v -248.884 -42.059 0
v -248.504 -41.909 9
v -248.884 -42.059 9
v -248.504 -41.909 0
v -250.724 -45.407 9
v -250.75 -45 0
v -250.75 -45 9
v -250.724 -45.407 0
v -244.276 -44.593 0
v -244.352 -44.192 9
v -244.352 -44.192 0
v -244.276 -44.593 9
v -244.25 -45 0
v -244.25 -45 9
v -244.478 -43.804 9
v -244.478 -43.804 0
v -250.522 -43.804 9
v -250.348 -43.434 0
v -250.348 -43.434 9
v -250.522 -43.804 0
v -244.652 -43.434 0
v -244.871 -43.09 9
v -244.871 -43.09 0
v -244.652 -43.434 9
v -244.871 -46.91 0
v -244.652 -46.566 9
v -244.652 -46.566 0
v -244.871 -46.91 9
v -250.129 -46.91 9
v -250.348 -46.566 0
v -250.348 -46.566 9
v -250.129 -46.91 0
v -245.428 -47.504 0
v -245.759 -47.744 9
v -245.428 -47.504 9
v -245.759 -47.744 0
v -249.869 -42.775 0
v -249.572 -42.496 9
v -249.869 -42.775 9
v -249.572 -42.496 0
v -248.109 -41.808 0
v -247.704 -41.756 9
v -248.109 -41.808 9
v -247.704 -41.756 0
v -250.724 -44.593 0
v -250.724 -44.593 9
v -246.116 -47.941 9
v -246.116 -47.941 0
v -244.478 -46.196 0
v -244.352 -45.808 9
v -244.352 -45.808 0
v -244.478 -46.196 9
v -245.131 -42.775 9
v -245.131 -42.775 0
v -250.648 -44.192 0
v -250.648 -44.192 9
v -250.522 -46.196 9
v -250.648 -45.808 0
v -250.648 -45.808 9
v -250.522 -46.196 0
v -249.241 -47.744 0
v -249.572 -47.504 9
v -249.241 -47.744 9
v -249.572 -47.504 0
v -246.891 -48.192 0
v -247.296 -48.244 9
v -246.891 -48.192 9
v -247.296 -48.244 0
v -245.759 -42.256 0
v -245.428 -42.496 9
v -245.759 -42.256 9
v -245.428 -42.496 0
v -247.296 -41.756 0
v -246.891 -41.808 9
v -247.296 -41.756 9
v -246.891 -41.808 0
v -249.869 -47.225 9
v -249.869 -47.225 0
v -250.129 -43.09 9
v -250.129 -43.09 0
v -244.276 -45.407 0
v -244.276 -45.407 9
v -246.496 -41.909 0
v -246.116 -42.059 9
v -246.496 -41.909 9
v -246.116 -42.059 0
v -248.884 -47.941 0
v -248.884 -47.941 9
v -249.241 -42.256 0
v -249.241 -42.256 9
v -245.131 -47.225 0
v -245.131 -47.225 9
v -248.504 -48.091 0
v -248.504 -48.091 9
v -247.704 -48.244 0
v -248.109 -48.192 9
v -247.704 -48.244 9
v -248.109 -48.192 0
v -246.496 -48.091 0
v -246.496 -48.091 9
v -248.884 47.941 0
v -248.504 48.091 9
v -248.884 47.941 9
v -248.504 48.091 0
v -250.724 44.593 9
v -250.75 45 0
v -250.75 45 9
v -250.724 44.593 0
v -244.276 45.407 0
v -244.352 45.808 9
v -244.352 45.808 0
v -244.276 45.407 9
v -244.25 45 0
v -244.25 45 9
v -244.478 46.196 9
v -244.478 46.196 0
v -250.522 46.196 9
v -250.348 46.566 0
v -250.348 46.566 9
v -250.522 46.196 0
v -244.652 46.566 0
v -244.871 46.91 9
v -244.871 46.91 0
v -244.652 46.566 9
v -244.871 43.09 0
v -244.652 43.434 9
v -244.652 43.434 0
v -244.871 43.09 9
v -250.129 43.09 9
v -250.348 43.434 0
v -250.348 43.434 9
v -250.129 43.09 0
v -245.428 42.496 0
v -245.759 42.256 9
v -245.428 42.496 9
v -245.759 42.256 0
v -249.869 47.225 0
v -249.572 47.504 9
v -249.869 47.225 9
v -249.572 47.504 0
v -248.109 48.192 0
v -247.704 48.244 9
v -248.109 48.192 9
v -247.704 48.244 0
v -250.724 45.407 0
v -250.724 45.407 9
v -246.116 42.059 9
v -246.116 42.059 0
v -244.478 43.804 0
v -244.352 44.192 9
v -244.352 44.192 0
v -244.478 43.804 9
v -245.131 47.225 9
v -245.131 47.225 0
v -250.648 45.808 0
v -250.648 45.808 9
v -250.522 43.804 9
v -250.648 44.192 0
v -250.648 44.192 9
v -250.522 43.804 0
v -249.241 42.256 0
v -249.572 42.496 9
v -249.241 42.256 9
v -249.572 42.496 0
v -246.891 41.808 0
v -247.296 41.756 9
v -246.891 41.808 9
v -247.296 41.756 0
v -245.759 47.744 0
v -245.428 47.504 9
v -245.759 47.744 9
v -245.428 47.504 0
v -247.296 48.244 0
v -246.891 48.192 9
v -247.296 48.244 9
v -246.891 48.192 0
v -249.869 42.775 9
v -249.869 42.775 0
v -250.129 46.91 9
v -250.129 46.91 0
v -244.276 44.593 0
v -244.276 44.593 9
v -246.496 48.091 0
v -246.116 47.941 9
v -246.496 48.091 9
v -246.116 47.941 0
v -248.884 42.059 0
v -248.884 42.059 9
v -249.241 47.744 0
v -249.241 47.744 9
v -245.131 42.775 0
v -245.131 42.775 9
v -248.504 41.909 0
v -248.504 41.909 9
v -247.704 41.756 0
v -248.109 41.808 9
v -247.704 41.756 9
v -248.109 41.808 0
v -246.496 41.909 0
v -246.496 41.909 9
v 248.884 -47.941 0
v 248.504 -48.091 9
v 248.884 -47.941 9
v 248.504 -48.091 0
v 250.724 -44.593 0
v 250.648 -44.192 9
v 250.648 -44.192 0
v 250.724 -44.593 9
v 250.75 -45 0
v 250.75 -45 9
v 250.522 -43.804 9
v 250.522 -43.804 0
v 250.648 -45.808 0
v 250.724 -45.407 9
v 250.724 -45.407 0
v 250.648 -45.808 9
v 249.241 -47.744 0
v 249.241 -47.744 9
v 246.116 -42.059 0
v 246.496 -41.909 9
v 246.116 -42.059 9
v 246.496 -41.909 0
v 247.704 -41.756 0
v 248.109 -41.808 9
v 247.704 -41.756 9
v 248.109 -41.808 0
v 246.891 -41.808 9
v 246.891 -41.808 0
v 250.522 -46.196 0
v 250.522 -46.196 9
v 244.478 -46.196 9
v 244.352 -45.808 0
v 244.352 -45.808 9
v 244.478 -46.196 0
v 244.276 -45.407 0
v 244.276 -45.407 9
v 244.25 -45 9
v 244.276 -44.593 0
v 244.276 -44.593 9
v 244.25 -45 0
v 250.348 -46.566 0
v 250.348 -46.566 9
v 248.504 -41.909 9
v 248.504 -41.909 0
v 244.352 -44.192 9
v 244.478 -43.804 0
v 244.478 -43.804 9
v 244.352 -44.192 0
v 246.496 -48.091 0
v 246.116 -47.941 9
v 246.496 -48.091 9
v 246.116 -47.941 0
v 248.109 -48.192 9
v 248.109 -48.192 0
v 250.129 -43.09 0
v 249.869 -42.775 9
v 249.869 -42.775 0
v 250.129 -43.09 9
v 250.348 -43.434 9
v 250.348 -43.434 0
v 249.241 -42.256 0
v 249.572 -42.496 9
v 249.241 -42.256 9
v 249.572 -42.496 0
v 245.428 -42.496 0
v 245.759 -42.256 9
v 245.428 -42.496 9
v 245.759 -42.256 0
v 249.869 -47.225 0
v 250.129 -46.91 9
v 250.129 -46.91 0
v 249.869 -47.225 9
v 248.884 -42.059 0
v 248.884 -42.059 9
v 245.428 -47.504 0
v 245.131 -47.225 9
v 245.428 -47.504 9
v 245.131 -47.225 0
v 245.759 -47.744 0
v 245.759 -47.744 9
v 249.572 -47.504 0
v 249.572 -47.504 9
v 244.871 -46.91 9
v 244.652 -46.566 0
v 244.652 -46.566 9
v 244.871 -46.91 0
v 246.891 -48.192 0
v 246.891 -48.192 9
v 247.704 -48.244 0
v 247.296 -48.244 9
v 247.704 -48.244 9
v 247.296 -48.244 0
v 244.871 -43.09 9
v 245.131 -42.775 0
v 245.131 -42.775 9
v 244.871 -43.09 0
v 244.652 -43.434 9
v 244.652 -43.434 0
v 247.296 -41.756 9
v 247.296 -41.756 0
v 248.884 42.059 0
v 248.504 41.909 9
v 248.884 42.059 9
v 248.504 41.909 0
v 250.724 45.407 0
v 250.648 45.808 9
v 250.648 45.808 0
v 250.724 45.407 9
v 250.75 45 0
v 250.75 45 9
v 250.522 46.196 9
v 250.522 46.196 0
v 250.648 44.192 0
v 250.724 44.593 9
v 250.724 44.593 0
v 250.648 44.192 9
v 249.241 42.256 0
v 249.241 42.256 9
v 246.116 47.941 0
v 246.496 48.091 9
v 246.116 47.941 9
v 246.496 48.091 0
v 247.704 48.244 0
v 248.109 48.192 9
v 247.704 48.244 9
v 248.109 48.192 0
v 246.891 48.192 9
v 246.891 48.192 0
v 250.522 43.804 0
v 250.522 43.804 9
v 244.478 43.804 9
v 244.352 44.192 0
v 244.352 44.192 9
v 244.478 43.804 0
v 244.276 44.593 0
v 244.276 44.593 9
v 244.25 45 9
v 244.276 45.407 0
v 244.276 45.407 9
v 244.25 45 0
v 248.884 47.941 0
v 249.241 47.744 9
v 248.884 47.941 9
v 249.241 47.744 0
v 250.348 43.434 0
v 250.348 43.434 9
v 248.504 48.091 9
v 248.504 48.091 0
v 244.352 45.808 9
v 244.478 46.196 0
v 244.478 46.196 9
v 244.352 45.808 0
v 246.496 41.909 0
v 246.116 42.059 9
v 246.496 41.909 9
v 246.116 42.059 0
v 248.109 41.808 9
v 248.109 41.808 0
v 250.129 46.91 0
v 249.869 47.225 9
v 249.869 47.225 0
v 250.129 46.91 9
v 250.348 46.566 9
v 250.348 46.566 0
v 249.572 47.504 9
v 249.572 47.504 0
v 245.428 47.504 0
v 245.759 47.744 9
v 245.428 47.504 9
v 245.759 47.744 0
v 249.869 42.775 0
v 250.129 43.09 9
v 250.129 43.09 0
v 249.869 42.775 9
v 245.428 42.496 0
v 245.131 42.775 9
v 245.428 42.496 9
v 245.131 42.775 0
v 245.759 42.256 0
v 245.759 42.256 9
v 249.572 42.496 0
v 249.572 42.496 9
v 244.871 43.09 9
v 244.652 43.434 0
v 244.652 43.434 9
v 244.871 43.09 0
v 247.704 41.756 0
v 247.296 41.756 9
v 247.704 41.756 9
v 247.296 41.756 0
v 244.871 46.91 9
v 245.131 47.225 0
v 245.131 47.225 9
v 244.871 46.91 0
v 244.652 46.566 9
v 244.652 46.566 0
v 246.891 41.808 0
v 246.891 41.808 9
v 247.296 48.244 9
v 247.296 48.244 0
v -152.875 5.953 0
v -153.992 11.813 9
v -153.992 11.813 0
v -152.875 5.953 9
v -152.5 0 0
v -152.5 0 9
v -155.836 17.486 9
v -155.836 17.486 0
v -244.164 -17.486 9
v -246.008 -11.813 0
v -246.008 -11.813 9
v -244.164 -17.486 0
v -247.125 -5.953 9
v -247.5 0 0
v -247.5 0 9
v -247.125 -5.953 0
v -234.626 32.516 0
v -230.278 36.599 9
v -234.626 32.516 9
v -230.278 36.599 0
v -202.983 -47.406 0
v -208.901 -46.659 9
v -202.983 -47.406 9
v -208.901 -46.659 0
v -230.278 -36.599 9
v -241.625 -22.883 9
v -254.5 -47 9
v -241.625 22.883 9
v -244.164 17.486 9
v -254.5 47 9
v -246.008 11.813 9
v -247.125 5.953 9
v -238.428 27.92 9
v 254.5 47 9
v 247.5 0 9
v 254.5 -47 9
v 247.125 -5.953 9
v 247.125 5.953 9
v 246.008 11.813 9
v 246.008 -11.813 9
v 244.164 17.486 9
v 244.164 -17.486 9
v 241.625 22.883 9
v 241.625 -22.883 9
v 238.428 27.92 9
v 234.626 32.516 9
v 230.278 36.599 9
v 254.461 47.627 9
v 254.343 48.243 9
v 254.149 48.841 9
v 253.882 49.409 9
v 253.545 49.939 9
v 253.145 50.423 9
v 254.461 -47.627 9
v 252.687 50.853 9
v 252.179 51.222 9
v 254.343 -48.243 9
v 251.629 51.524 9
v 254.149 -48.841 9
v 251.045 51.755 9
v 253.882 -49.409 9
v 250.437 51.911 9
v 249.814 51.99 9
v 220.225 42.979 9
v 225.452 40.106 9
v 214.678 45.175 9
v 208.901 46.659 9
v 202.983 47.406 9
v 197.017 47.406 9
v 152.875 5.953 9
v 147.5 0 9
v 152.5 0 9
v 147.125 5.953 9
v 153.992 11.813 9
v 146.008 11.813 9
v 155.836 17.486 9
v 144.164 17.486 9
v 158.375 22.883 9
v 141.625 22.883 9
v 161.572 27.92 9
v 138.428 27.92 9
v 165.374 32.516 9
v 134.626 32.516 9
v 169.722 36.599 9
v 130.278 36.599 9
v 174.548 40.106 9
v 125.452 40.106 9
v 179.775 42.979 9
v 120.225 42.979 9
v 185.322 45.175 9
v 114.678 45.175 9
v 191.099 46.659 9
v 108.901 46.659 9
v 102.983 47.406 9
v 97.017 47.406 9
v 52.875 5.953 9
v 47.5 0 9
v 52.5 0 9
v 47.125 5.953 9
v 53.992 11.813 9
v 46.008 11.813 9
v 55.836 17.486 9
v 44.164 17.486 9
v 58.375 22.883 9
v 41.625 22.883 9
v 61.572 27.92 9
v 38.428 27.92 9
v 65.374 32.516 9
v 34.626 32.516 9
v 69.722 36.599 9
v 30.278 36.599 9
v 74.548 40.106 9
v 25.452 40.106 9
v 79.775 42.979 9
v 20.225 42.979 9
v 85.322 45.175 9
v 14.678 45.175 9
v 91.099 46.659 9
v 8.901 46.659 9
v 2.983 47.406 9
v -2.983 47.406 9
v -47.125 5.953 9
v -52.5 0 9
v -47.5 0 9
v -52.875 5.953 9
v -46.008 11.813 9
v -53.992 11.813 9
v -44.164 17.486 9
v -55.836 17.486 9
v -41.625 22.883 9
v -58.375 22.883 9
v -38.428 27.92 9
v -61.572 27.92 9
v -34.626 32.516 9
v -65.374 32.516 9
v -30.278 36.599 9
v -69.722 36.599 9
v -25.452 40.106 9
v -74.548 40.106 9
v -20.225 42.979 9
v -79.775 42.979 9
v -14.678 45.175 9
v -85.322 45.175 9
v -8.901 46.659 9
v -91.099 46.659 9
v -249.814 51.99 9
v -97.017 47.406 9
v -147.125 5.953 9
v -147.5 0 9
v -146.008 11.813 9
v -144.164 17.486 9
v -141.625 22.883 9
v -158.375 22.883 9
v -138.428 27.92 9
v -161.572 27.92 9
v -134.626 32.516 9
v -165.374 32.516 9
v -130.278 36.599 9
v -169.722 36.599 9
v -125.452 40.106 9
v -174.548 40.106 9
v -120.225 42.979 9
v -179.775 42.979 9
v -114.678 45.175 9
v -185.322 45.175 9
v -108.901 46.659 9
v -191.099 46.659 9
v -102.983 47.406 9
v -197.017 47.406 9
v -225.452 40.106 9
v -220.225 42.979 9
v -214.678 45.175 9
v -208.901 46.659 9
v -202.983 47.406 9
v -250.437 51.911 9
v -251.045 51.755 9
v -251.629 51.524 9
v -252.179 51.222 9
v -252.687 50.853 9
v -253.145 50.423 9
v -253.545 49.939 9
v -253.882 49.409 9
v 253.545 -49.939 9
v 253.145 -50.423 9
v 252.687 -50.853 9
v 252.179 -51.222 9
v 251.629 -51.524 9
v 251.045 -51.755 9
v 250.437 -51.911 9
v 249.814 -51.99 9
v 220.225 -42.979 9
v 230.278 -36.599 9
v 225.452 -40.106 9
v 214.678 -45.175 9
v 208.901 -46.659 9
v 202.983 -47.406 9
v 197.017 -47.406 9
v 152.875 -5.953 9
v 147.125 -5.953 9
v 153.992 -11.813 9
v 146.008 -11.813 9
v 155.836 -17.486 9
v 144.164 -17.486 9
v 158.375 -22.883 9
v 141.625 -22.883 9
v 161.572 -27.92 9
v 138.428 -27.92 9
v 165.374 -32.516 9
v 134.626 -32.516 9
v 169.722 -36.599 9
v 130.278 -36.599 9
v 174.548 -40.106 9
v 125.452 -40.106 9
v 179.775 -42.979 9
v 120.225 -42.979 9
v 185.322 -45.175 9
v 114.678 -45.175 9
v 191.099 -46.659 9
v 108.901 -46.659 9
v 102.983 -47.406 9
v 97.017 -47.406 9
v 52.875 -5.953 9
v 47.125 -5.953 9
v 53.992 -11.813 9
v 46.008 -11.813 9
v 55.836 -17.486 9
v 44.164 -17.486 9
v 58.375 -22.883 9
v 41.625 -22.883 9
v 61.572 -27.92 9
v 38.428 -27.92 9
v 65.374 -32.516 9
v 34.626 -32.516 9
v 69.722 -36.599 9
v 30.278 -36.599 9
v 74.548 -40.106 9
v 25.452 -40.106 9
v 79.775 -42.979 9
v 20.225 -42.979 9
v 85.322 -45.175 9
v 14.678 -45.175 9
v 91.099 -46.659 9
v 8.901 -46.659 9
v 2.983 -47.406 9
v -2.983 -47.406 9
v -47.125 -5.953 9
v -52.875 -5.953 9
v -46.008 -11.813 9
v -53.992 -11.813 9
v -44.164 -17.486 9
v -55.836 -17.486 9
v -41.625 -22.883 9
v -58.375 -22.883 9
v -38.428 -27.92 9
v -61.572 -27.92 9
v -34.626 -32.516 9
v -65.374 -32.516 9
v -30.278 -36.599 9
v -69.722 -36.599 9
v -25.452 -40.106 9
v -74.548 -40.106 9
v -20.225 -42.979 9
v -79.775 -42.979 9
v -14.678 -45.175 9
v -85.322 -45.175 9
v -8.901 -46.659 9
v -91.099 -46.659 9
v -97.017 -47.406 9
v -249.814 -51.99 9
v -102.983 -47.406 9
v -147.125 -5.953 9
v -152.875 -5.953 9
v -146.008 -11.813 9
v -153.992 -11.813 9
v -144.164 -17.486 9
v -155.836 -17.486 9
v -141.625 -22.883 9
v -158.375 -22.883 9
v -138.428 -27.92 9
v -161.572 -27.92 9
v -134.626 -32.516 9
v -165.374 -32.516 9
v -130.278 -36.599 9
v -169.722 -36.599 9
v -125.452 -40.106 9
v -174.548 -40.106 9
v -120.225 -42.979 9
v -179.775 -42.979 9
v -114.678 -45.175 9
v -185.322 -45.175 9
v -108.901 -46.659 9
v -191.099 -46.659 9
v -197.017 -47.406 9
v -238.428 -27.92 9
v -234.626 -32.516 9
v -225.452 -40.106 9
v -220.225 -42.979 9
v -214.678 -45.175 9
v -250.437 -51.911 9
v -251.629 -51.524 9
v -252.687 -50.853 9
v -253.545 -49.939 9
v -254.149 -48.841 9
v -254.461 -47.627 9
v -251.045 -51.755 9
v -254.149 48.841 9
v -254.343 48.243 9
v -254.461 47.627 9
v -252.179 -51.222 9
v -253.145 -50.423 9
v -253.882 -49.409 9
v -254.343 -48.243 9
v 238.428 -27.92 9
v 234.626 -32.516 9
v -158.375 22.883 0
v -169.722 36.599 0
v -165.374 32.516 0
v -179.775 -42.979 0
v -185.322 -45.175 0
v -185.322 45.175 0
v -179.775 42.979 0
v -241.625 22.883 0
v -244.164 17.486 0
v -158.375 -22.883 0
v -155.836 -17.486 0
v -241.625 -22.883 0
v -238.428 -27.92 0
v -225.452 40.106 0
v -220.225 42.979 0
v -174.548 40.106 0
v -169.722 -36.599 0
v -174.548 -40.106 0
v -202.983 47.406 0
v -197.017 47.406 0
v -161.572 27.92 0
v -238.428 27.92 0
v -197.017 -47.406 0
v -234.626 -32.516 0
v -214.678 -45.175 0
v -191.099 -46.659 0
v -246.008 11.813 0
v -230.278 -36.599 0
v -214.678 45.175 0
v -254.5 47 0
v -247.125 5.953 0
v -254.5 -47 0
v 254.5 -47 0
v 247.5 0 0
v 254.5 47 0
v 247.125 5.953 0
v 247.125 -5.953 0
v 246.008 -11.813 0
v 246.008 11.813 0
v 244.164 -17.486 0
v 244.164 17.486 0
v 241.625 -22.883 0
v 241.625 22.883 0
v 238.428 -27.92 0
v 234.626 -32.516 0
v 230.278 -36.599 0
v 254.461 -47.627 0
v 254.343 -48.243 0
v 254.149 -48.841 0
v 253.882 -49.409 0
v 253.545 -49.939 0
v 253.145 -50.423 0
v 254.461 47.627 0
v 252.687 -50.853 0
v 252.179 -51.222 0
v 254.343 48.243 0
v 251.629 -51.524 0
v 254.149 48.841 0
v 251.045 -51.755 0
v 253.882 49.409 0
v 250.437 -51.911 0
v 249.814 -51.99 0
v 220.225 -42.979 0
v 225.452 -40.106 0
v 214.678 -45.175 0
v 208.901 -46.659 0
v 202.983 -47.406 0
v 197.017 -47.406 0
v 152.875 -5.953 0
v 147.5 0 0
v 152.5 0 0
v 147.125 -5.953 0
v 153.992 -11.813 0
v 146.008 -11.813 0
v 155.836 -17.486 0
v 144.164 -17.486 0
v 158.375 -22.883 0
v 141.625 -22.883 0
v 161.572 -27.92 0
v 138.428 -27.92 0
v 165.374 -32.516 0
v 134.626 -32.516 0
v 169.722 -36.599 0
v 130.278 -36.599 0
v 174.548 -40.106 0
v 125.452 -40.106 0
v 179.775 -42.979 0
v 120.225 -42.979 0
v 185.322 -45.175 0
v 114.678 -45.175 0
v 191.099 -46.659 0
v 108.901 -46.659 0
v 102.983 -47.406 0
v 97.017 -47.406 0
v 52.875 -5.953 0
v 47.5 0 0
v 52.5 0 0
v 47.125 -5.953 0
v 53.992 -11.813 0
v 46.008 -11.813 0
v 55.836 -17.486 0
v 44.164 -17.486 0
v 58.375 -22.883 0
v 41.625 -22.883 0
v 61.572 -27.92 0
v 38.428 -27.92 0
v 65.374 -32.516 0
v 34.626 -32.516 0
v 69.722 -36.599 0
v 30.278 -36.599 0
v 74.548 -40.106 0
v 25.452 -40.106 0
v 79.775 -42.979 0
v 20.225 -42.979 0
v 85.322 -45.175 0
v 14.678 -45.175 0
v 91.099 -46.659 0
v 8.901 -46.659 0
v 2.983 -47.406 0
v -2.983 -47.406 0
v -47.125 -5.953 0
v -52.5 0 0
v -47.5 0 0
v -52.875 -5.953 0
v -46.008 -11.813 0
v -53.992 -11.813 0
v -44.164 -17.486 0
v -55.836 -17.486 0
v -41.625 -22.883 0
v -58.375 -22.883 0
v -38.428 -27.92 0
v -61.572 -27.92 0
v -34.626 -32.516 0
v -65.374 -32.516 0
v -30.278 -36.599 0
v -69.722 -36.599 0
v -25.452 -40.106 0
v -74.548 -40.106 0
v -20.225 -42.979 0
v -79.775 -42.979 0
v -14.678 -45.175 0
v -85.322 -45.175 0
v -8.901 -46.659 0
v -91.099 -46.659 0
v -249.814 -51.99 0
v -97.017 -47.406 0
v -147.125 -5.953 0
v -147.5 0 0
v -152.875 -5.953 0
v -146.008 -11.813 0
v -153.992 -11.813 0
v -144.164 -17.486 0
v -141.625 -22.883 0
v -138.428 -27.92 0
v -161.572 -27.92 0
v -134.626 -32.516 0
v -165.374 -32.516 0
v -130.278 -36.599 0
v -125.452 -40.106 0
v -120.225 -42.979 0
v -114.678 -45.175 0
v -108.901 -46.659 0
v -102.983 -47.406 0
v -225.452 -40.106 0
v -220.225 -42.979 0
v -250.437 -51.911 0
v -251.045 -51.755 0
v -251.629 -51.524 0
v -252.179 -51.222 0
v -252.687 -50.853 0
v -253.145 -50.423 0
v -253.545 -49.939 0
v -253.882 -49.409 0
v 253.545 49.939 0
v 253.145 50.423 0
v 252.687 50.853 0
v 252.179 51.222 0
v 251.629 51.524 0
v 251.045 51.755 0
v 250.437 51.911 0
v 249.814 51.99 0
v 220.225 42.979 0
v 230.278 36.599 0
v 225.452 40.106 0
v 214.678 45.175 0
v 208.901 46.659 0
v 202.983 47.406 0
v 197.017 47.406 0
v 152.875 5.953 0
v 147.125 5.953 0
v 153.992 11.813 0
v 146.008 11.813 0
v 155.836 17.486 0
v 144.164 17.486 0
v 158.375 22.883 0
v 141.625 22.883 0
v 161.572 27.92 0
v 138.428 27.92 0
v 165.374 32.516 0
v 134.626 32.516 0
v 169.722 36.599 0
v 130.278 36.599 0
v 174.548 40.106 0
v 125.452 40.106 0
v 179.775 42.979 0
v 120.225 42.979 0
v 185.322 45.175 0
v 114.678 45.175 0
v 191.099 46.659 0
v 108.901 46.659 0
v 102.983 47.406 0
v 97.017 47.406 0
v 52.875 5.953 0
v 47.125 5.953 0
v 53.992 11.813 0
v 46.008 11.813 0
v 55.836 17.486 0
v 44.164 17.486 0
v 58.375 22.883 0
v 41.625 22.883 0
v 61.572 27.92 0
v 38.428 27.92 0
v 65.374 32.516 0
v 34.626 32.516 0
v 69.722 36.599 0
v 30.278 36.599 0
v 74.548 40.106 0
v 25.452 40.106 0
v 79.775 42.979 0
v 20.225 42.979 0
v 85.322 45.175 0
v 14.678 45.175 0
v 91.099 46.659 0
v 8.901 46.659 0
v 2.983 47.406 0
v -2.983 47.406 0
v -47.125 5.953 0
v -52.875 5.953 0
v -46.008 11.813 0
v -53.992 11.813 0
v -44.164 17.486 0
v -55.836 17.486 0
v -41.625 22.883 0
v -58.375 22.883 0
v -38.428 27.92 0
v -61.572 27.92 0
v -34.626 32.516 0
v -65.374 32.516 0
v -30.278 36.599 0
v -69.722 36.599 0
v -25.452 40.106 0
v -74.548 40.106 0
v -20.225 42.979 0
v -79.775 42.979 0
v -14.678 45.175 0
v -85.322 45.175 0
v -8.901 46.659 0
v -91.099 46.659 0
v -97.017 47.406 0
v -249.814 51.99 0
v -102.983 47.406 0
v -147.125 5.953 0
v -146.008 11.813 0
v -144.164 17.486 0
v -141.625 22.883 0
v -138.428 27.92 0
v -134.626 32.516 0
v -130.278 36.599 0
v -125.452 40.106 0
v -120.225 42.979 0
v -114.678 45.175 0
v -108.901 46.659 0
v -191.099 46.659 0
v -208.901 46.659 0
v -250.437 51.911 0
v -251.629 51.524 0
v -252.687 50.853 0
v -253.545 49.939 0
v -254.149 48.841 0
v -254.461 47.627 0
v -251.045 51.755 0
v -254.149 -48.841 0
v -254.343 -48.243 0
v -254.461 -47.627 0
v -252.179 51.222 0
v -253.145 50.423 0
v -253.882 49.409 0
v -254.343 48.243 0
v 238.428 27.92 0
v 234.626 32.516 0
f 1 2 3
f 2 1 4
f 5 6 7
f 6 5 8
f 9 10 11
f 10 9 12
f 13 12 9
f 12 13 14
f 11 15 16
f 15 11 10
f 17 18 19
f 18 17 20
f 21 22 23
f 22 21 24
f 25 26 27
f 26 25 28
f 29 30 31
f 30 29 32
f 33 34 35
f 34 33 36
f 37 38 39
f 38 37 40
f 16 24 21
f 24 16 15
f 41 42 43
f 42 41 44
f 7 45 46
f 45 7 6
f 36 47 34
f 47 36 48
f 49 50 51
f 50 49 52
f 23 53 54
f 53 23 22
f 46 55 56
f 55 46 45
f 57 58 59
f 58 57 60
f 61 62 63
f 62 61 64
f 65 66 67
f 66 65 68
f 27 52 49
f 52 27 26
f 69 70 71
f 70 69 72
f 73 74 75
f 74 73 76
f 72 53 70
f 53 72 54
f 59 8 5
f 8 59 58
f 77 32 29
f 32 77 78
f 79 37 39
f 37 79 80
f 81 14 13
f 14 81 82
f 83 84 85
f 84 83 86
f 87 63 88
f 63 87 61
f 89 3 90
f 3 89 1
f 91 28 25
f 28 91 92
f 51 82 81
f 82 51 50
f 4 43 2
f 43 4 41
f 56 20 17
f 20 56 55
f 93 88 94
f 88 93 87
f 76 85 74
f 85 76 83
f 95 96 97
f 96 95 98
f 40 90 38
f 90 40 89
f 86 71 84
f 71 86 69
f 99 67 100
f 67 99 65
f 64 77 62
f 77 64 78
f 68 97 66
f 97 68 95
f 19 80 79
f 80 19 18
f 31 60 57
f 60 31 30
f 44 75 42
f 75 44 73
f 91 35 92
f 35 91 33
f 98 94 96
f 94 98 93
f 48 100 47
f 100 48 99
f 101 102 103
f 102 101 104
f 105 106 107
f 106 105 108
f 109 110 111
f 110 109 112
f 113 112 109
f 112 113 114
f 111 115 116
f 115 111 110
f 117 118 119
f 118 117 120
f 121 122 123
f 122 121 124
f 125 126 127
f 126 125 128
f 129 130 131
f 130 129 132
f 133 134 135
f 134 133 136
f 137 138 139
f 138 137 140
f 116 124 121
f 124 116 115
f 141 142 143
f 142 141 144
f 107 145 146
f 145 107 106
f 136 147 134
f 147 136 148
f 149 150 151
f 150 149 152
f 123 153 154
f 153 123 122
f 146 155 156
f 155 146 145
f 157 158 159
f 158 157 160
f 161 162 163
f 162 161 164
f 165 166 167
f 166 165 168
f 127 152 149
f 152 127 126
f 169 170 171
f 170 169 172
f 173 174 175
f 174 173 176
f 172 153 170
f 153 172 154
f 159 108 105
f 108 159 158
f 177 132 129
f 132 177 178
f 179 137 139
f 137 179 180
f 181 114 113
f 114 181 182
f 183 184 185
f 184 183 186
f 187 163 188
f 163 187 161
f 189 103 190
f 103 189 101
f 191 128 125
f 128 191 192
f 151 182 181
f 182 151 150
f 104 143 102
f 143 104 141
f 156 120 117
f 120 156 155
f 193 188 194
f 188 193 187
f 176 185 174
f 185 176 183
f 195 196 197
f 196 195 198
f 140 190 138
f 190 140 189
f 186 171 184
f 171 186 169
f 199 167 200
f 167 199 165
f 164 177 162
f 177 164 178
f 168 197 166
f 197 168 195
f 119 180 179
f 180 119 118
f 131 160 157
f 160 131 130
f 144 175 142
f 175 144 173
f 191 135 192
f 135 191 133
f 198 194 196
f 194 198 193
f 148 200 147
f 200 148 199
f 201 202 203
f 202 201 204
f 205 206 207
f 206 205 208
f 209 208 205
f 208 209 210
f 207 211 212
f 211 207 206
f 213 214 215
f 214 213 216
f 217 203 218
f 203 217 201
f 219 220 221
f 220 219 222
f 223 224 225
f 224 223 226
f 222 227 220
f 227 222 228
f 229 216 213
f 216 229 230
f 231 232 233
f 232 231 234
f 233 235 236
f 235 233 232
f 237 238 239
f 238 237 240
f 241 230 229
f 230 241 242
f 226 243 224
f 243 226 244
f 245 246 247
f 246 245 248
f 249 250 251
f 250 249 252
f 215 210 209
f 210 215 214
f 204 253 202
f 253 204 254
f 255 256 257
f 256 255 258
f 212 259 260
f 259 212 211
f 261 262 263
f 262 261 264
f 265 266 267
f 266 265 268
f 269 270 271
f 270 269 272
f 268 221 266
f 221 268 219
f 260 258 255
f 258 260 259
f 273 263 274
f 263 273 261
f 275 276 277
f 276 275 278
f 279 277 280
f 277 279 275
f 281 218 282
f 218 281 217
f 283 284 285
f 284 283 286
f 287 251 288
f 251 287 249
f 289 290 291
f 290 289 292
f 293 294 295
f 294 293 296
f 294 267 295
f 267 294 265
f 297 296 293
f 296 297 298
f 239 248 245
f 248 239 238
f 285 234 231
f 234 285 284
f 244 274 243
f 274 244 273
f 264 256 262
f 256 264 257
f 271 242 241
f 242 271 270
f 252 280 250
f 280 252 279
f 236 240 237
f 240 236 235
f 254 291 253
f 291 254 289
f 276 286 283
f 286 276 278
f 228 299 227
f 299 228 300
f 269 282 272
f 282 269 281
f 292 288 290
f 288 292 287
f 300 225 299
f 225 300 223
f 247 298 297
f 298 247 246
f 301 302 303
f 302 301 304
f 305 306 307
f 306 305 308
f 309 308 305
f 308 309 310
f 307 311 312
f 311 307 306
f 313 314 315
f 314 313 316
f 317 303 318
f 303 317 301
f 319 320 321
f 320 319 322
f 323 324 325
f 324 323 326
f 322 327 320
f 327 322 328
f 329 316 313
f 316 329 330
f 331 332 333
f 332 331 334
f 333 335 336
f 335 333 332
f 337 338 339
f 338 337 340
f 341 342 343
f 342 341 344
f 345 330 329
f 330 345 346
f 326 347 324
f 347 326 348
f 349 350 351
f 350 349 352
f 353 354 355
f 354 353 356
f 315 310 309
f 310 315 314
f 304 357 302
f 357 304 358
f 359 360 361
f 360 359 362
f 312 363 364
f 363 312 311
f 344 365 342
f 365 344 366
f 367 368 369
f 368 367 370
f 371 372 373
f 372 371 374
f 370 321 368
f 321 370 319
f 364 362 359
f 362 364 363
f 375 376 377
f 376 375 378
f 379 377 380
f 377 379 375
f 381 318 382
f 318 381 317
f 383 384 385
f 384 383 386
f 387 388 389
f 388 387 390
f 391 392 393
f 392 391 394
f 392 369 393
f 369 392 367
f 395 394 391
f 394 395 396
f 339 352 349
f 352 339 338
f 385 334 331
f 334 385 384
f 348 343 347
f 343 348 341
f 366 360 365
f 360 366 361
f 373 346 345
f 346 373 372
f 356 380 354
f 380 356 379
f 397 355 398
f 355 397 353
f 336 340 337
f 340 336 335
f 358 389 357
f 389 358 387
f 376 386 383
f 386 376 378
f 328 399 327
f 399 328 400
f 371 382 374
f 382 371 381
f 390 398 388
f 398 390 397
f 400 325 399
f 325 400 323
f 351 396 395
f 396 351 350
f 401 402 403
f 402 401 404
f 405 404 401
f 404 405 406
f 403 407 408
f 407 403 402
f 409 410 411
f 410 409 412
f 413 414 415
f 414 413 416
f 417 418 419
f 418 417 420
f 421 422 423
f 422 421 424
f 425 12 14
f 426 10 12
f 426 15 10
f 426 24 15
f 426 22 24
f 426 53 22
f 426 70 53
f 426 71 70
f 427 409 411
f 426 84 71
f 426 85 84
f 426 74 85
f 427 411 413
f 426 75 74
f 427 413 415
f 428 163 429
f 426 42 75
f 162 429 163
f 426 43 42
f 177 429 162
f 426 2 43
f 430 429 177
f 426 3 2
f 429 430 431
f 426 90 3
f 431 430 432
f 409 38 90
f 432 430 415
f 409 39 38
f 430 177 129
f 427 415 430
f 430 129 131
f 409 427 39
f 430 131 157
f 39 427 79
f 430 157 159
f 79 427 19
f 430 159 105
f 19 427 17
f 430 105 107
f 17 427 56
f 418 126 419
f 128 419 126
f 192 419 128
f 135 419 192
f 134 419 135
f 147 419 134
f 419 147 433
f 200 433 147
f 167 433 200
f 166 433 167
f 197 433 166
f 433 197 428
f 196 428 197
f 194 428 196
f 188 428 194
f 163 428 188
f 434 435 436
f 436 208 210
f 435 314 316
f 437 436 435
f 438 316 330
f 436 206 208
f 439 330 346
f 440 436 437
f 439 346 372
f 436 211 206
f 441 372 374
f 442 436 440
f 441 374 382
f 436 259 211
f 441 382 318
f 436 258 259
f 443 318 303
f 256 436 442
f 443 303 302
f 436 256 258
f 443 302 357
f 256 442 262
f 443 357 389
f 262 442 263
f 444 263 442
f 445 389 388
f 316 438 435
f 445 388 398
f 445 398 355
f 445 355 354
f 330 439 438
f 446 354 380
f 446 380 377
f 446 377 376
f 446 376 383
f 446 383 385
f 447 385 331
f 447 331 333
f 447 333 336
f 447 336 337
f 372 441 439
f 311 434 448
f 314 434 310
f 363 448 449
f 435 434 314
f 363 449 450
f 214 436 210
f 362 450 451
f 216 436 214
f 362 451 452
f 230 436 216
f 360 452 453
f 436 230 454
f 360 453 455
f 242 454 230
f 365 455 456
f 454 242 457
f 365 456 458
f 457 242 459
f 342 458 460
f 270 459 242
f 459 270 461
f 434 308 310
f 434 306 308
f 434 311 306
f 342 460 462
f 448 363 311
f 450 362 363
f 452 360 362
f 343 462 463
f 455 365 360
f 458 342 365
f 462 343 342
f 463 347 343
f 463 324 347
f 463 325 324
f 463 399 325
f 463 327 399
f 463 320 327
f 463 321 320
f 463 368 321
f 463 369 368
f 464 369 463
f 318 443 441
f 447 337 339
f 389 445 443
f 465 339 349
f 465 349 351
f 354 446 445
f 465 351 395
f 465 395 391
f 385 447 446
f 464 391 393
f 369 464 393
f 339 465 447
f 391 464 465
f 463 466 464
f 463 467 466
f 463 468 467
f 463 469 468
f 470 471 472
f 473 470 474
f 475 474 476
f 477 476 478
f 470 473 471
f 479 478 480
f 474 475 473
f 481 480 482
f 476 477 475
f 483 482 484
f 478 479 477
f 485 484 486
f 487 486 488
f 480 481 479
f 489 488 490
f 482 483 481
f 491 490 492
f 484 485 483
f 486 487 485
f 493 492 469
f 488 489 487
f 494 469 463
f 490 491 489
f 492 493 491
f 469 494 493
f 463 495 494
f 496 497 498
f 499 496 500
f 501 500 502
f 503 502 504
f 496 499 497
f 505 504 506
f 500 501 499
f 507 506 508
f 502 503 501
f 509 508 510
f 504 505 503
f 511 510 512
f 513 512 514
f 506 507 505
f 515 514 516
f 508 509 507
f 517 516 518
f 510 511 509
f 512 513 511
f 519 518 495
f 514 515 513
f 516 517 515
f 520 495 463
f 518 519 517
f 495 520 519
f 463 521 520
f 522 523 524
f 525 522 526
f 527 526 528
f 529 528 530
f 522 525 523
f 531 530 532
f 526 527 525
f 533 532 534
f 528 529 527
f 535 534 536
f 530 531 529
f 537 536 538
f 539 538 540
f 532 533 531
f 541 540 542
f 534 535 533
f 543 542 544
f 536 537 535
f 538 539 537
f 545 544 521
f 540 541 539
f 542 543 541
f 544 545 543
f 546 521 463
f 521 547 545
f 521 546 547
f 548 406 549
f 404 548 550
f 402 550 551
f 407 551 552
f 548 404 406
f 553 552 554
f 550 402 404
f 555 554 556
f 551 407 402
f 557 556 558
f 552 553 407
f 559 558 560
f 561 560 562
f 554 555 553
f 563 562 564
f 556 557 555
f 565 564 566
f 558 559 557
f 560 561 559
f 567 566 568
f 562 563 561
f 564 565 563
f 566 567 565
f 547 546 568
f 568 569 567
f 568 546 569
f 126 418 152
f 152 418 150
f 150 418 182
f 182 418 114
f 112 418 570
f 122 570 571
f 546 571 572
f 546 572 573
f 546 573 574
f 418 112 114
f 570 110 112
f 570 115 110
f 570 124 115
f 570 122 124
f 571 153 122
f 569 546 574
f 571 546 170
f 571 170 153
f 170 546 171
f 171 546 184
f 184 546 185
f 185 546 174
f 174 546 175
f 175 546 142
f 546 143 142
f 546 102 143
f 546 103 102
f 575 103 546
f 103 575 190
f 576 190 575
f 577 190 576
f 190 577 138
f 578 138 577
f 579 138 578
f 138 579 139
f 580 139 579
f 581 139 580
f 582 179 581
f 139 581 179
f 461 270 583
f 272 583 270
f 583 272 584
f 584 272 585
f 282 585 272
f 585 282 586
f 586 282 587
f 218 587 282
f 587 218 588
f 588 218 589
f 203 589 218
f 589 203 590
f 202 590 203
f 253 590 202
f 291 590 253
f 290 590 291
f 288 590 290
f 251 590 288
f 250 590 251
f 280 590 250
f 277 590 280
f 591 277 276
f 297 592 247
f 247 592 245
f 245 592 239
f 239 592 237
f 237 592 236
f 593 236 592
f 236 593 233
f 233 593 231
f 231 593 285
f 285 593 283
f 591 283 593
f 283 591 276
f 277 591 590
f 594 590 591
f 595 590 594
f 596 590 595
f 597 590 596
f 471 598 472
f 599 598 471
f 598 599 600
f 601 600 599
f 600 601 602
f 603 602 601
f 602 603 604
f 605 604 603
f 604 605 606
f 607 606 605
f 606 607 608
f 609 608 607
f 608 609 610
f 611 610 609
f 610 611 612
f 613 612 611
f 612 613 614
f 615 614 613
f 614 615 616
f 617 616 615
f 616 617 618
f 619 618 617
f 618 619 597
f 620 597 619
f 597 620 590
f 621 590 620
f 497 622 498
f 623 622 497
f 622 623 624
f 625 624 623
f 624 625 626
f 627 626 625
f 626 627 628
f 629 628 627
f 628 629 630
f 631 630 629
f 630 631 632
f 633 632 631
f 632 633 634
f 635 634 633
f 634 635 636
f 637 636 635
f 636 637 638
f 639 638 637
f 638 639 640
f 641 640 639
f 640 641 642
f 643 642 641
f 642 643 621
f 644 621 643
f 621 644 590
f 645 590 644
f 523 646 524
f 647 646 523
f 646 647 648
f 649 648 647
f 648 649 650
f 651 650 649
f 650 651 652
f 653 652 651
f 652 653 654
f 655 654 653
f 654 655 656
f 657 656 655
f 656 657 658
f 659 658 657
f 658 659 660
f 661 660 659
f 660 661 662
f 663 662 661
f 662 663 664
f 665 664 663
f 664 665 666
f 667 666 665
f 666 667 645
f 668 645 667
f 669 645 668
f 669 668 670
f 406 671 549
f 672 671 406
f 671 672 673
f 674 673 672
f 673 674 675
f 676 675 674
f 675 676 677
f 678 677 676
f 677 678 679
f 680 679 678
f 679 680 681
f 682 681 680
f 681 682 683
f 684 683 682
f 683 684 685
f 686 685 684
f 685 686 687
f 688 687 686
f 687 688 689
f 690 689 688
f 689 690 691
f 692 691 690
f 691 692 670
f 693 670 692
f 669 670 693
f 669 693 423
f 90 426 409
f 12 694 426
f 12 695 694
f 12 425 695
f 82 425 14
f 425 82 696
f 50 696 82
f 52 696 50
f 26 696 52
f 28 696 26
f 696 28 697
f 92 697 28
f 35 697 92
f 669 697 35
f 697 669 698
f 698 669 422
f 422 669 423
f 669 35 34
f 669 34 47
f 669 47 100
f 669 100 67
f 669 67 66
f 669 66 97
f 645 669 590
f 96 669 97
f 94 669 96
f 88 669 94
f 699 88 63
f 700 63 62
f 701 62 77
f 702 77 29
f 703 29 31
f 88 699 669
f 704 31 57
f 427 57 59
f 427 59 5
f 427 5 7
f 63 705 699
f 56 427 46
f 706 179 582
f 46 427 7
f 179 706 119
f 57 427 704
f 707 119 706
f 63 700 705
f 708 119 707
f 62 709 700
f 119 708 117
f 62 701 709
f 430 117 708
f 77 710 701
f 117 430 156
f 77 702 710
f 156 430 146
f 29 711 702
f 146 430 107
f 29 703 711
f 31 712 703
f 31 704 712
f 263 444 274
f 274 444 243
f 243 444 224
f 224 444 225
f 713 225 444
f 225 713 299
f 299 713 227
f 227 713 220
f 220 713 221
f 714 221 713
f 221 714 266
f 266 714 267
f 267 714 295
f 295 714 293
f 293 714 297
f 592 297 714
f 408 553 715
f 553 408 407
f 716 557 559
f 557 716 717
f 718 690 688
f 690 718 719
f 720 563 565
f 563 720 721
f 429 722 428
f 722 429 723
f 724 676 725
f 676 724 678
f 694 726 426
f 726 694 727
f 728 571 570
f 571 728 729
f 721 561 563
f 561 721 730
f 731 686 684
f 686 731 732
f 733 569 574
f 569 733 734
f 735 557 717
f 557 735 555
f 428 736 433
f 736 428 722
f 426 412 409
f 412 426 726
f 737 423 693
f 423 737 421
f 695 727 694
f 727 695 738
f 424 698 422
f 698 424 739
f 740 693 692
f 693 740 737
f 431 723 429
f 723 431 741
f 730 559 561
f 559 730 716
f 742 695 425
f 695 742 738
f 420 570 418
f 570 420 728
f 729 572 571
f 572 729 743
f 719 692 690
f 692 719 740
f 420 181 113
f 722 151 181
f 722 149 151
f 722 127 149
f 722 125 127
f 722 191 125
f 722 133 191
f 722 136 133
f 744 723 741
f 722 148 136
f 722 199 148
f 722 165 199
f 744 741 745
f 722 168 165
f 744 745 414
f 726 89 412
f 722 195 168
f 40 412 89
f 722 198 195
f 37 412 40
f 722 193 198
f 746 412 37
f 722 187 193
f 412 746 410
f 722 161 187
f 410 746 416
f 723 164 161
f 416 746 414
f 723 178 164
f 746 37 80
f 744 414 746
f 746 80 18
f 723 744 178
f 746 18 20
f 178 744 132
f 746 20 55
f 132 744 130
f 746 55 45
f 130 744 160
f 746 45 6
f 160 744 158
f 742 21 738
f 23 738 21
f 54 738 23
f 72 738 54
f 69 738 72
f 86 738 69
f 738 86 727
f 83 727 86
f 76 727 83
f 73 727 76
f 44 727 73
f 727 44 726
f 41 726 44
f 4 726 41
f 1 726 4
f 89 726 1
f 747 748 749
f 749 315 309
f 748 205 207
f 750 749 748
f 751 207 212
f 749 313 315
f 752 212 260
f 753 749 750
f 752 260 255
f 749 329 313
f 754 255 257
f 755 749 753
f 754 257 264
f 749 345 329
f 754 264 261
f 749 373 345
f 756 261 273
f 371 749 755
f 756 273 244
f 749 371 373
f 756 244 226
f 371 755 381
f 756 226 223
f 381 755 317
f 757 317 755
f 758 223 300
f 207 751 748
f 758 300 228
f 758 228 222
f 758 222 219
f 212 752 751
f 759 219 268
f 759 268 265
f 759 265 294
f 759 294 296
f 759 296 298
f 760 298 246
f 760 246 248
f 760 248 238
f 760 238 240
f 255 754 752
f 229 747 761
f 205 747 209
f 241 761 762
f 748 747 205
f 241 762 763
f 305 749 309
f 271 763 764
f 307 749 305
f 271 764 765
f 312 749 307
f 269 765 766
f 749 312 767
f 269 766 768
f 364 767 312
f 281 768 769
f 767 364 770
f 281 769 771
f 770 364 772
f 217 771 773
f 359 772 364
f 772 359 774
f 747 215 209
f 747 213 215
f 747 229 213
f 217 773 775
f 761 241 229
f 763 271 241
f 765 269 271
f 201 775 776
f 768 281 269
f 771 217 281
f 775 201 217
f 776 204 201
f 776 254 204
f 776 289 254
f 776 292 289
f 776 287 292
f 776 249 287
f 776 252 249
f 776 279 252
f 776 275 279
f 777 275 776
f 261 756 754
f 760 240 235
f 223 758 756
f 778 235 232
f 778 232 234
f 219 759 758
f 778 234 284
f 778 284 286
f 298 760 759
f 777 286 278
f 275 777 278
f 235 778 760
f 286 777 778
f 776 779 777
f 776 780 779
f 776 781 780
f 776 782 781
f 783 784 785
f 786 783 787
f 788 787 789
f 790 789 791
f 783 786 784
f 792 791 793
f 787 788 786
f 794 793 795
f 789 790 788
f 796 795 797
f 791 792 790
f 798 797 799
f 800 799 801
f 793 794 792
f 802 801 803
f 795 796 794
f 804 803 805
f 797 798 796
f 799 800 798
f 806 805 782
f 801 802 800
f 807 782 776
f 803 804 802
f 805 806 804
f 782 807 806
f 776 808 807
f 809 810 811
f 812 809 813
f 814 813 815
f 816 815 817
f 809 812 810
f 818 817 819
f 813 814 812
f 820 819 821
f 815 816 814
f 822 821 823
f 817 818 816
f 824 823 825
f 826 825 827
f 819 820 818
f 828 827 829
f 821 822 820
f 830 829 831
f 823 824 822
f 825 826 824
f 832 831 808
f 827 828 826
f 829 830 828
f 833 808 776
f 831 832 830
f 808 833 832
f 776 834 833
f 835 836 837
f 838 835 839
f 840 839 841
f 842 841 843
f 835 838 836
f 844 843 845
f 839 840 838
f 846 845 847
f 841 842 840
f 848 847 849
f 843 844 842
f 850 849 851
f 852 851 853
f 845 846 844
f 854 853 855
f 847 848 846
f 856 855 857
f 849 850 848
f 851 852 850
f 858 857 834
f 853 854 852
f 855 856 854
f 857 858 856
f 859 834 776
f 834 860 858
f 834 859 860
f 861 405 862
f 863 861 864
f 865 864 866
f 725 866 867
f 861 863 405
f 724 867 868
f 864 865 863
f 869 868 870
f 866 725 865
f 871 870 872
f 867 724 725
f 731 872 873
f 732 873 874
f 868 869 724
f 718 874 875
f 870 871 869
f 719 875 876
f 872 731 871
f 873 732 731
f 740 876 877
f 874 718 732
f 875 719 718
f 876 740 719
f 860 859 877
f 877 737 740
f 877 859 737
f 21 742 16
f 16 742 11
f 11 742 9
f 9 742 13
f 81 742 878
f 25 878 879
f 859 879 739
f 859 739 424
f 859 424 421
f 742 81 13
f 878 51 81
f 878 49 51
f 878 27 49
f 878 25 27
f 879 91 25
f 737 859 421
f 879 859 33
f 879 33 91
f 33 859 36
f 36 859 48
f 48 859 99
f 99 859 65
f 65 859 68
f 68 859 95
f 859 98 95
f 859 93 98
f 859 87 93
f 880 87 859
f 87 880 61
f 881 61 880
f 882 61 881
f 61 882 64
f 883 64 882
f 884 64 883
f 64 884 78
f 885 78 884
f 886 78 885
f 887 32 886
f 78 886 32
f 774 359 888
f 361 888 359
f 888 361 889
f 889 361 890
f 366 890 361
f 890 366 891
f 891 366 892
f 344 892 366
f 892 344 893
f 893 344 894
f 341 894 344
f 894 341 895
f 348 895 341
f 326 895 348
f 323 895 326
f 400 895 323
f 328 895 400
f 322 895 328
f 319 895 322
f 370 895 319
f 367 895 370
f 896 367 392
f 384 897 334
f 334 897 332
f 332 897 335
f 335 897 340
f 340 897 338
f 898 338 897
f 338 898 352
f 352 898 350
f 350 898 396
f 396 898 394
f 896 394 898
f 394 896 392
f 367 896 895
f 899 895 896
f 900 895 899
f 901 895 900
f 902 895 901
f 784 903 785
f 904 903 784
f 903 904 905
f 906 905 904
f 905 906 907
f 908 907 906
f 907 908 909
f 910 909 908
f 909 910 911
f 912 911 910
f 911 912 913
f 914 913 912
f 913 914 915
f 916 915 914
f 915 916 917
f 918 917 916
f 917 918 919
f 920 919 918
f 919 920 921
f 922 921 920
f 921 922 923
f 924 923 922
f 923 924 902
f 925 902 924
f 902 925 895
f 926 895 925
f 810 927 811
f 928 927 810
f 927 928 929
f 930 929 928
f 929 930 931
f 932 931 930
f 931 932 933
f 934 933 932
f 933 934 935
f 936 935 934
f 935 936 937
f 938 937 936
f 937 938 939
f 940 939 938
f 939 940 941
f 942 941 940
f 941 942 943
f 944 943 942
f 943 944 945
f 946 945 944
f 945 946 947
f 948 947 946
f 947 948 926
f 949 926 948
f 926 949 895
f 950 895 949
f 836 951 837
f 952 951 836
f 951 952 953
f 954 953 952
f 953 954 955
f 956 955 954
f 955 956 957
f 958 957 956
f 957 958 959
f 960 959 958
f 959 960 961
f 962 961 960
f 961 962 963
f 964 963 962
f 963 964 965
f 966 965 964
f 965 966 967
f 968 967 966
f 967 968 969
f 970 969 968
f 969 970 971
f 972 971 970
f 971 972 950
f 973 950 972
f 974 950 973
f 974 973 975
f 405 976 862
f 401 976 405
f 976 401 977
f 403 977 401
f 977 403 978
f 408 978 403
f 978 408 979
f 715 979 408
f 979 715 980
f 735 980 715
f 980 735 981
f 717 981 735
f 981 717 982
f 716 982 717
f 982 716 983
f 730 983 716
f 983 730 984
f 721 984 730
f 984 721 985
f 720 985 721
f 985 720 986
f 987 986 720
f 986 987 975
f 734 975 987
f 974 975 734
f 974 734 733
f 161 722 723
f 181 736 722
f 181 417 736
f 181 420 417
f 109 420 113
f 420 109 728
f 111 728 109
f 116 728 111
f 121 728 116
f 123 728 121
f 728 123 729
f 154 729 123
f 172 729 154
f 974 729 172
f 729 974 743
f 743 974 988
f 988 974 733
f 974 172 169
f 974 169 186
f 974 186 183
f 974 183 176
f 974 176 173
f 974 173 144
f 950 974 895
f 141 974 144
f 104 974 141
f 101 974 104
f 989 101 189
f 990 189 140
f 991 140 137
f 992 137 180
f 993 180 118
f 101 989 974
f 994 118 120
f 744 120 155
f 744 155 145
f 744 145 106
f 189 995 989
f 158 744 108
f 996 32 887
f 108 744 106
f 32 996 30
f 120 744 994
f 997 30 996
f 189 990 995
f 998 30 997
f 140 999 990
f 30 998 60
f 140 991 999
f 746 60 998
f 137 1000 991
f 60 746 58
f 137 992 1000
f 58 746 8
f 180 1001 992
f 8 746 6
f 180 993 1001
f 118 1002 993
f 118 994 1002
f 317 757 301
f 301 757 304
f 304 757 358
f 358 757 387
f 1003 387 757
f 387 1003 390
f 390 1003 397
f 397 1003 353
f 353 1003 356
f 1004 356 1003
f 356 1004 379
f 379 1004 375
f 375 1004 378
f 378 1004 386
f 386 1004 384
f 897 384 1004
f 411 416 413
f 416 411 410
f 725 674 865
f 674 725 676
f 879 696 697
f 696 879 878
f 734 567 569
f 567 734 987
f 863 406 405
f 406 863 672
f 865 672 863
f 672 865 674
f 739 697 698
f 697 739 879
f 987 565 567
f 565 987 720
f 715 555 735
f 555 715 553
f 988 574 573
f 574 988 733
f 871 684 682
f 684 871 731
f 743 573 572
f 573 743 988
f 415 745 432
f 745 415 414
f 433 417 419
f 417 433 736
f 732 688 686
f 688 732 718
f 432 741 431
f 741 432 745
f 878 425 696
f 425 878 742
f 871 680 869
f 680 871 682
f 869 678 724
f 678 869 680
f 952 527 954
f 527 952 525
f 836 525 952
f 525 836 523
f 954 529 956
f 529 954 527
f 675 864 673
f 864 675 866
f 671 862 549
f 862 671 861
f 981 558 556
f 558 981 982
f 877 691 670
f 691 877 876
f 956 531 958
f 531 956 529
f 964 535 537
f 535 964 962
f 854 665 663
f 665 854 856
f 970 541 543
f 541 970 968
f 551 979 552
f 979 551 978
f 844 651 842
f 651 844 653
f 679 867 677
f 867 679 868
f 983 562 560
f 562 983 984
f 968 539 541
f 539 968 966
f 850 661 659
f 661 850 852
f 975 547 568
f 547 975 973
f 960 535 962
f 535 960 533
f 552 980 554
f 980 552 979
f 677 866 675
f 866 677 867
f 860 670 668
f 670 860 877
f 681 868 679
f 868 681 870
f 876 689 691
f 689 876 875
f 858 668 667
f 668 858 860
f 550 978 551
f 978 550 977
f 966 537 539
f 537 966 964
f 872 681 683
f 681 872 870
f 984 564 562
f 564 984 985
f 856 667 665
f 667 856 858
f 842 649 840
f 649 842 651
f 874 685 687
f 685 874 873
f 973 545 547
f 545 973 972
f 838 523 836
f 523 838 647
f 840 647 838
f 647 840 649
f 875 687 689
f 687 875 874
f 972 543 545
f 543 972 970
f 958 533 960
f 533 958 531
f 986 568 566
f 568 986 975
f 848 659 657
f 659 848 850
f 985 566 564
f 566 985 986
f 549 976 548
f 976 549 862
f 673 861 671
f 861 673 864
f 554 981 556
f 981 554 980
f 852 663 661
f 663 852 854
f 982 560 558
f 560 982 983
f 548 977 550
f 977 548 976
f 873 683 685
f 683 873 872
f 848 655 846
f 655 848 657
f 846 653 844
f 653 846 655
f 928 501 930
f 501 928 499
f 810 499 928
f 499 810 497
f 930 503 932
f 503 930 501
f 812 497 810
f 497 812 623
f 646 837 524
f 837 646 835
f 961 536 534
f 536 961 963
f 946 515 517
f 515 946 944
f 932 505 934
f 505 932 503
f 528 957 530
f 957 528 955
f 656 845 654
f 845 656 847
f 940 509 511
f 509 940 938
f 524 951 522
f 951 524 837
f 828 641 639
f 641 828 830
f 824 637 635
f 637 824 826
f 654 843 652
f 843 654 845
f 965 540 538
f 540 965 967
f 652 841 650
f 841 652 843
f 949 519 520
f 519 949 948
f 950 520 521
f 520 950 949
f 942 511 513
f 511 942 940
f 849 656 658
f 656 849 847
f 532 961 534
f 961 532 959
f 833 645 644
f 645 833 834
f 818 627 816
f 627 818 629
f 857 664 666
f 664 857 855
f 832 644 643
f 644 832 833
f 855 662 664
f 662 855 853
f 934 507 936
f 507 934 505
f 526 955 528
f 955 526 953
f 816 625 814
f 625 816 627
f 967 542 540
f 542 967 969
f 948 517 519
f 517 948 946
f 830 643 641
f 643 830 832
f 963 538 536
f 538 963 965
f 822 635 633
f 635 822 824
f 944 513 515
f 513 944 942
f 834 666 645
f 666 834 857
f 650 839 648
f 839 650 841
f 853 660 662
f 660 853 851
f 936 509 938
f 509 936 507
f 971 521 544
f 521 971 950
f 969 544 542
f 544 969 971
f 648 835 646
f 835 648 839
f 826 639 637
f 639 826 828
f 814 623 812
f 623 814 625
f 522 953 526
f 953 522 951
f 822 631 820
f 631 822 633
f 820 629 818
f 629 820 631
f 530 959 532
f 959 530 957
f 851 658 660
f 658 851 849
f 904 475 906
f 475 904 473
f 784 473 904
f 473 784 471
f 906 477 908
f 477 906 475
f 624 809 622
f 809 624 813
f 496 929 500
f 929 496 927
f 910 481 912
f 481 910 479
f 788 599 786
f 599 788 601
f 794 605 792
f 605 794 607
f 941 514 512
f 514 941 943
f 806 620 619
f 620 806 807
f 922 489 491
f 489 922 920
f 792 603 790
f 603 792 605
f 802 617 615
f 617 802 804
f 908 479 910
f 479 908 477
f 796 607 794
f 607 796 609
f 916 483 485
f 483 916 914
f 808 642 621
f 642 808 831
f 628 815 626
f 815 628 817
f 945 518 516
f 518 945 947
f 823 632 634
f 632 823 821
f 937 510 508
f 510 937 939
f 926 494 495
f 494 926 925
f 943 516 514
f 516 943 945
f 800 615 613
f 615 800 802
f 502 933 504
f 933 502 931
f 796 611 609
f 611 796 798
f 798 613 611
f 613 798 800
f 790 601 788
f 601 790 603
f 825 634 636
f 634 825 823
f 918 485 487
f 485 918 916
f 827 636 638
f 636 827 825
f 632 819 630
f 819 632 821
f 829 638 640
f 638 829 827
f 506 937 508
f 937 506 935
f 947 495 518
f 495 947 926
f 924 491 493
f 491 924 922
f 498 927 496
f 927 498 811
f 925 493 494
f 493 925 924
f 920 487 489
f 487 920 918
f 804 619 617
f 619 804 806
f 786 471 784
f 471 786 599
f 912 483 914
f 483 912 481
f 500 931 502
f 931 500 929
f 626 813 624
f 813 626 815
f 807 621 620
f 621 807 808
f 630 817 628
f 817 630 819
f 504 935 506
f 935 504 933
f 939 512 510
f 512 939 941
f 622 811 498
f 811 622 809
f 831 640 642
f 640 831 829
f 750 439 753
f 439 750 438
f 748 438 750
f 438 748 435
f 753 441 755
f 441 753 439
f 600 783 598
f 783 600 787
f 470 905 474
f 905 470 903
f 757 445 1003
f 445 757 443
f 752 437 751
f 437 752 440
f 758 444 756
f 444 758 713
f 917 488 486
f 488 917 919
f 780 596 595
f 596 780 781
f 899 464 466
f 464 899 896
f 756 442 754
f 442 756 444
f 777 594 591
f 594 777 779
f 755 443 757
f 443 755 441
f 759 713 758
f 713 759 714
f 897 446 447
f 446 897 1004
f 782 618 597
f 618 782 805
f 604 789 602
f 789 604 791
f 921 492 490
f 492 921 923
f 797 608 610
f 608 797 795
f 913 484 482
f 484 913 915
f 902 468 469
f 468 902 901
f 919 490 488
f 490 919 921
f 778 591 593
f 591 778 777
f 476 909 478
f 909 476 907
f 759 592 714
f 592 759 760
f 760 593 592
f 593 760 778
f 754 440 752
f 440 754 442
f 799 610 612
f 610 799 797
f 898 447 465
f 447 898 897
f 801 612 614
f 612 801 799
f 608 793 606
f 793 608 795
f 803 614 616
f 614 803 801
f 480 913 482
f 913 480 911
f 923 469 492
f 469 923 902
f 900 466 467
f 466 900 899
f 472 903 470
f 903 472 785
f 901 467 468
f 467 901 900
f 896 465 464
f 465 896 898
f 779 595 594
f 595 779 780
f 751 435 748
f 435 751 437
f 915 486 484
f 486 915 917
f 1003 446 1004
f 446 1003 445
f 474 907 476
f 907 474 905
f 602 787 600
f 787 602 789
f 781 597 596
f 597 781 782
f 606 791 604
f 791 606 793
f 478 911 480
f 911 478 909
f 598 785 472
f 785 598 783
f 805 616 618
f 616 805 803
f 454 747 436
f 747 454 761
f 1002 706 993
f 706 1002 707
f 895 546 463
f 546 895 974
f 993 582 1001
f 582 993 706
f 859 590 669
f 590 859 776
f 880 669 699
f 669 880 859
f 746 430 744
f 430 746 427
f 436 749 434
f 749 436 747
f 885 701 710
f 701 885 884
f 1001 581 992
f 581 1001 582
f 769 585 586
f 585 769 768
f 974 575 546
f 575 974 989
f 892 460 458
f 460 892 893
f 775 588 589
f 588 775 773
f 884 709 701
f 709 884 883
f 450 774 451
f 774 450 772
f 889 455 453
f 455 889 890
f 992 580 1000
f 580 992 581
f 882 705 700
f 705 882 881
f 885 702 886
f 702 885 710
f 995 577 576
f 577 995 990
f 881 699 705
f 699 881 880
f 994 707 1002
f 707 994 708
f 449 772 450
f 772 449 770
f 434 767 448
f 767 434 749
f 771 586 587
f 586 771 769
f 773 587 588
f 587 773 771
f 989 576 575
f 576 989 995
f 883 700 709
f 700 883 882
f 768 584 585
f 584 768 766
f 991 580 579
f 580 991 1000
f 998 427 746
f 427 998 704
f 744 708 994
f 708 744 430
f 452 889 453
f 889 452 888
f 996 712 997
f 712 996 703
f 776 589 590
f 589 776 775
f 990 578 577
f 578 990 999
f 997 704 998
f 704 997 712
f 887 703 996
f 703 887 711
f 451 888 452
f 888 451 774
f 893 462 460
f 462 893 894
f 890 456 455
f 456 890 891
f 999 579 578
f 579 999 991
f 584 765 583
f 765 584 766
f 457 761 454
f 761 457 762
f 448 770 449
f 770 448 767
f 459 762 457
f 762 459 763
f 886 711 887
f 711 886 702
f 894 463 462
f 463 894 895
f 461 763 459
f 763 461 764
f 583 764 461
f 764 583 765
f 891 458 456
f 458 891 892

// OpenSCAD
$fn = 50;

difference() {
	union() {
		hull() {
			translate(v = [-249.5, 47.0, 0]) {
				cylinder(h = 9, r = 5);
			}
			translate(v = [249.5, 47.0, 0]) {
				cylinder(h = 9, r = 5);
			}
			translate(v = [-249.5, -47.0, 0]) {
				cylinder(h = 9, r = 5);
			}
			translate(v = [249.5, -47.0, 0]) {
				cylinder(h = 9, r = 5);
			}
		}
	}
	union() {
		translate(v = [-247.5, -45.0, -100.0]) {
			cylinder(h = 200, r = 3.25);
		}
		translate(v = [-247.5, 45.0, -100.0]) {
			cylinder(h = 200, r = 3.25);
		}
		translate(v = [247.5, -45.0, -100.0]) {
			cylinder(h = 200, r = 3.25);
		}
		translate(v = [247.5, 45.0, -100.0]) {
			cylinder(h = 200, r = 3.25);
		}
		translate(v = [-247.5, -45.0, -100.0]) {
			cylinder(h = 200, r = 1.8);
		}
		translate(v = [-247.5, 45.0, -100.0]) {
			cylinder(h = 200, r = 1.8);
		}
		translate(v = [247.5, -45.0, -100.0]) {
			cylinder(h = 200, r = 1.8);
		}
		translate(v = [247.5, 45.0, -100.0]) {
			cylinder(h = 200, r = 1.8);
		}
		translate(v = [-200.0, 0, 0.0]) {
			cylinder(h = 9, r = 47.5);
		}
		translate(v = [-100.0, 0, 0.0]) {
			cylinder(h = 9, r = 47.5);
		}
		cylinder(h = 9, r = 47.5);
		translate(v = [100.0, 0, 0.0]) {
			cylinder(h = 9, r = 47.5);
		}
		translate(v = [200.0, 0, 0.0]) {
			cylinder(h = 9, r = 47.5);
		}
	}
}
